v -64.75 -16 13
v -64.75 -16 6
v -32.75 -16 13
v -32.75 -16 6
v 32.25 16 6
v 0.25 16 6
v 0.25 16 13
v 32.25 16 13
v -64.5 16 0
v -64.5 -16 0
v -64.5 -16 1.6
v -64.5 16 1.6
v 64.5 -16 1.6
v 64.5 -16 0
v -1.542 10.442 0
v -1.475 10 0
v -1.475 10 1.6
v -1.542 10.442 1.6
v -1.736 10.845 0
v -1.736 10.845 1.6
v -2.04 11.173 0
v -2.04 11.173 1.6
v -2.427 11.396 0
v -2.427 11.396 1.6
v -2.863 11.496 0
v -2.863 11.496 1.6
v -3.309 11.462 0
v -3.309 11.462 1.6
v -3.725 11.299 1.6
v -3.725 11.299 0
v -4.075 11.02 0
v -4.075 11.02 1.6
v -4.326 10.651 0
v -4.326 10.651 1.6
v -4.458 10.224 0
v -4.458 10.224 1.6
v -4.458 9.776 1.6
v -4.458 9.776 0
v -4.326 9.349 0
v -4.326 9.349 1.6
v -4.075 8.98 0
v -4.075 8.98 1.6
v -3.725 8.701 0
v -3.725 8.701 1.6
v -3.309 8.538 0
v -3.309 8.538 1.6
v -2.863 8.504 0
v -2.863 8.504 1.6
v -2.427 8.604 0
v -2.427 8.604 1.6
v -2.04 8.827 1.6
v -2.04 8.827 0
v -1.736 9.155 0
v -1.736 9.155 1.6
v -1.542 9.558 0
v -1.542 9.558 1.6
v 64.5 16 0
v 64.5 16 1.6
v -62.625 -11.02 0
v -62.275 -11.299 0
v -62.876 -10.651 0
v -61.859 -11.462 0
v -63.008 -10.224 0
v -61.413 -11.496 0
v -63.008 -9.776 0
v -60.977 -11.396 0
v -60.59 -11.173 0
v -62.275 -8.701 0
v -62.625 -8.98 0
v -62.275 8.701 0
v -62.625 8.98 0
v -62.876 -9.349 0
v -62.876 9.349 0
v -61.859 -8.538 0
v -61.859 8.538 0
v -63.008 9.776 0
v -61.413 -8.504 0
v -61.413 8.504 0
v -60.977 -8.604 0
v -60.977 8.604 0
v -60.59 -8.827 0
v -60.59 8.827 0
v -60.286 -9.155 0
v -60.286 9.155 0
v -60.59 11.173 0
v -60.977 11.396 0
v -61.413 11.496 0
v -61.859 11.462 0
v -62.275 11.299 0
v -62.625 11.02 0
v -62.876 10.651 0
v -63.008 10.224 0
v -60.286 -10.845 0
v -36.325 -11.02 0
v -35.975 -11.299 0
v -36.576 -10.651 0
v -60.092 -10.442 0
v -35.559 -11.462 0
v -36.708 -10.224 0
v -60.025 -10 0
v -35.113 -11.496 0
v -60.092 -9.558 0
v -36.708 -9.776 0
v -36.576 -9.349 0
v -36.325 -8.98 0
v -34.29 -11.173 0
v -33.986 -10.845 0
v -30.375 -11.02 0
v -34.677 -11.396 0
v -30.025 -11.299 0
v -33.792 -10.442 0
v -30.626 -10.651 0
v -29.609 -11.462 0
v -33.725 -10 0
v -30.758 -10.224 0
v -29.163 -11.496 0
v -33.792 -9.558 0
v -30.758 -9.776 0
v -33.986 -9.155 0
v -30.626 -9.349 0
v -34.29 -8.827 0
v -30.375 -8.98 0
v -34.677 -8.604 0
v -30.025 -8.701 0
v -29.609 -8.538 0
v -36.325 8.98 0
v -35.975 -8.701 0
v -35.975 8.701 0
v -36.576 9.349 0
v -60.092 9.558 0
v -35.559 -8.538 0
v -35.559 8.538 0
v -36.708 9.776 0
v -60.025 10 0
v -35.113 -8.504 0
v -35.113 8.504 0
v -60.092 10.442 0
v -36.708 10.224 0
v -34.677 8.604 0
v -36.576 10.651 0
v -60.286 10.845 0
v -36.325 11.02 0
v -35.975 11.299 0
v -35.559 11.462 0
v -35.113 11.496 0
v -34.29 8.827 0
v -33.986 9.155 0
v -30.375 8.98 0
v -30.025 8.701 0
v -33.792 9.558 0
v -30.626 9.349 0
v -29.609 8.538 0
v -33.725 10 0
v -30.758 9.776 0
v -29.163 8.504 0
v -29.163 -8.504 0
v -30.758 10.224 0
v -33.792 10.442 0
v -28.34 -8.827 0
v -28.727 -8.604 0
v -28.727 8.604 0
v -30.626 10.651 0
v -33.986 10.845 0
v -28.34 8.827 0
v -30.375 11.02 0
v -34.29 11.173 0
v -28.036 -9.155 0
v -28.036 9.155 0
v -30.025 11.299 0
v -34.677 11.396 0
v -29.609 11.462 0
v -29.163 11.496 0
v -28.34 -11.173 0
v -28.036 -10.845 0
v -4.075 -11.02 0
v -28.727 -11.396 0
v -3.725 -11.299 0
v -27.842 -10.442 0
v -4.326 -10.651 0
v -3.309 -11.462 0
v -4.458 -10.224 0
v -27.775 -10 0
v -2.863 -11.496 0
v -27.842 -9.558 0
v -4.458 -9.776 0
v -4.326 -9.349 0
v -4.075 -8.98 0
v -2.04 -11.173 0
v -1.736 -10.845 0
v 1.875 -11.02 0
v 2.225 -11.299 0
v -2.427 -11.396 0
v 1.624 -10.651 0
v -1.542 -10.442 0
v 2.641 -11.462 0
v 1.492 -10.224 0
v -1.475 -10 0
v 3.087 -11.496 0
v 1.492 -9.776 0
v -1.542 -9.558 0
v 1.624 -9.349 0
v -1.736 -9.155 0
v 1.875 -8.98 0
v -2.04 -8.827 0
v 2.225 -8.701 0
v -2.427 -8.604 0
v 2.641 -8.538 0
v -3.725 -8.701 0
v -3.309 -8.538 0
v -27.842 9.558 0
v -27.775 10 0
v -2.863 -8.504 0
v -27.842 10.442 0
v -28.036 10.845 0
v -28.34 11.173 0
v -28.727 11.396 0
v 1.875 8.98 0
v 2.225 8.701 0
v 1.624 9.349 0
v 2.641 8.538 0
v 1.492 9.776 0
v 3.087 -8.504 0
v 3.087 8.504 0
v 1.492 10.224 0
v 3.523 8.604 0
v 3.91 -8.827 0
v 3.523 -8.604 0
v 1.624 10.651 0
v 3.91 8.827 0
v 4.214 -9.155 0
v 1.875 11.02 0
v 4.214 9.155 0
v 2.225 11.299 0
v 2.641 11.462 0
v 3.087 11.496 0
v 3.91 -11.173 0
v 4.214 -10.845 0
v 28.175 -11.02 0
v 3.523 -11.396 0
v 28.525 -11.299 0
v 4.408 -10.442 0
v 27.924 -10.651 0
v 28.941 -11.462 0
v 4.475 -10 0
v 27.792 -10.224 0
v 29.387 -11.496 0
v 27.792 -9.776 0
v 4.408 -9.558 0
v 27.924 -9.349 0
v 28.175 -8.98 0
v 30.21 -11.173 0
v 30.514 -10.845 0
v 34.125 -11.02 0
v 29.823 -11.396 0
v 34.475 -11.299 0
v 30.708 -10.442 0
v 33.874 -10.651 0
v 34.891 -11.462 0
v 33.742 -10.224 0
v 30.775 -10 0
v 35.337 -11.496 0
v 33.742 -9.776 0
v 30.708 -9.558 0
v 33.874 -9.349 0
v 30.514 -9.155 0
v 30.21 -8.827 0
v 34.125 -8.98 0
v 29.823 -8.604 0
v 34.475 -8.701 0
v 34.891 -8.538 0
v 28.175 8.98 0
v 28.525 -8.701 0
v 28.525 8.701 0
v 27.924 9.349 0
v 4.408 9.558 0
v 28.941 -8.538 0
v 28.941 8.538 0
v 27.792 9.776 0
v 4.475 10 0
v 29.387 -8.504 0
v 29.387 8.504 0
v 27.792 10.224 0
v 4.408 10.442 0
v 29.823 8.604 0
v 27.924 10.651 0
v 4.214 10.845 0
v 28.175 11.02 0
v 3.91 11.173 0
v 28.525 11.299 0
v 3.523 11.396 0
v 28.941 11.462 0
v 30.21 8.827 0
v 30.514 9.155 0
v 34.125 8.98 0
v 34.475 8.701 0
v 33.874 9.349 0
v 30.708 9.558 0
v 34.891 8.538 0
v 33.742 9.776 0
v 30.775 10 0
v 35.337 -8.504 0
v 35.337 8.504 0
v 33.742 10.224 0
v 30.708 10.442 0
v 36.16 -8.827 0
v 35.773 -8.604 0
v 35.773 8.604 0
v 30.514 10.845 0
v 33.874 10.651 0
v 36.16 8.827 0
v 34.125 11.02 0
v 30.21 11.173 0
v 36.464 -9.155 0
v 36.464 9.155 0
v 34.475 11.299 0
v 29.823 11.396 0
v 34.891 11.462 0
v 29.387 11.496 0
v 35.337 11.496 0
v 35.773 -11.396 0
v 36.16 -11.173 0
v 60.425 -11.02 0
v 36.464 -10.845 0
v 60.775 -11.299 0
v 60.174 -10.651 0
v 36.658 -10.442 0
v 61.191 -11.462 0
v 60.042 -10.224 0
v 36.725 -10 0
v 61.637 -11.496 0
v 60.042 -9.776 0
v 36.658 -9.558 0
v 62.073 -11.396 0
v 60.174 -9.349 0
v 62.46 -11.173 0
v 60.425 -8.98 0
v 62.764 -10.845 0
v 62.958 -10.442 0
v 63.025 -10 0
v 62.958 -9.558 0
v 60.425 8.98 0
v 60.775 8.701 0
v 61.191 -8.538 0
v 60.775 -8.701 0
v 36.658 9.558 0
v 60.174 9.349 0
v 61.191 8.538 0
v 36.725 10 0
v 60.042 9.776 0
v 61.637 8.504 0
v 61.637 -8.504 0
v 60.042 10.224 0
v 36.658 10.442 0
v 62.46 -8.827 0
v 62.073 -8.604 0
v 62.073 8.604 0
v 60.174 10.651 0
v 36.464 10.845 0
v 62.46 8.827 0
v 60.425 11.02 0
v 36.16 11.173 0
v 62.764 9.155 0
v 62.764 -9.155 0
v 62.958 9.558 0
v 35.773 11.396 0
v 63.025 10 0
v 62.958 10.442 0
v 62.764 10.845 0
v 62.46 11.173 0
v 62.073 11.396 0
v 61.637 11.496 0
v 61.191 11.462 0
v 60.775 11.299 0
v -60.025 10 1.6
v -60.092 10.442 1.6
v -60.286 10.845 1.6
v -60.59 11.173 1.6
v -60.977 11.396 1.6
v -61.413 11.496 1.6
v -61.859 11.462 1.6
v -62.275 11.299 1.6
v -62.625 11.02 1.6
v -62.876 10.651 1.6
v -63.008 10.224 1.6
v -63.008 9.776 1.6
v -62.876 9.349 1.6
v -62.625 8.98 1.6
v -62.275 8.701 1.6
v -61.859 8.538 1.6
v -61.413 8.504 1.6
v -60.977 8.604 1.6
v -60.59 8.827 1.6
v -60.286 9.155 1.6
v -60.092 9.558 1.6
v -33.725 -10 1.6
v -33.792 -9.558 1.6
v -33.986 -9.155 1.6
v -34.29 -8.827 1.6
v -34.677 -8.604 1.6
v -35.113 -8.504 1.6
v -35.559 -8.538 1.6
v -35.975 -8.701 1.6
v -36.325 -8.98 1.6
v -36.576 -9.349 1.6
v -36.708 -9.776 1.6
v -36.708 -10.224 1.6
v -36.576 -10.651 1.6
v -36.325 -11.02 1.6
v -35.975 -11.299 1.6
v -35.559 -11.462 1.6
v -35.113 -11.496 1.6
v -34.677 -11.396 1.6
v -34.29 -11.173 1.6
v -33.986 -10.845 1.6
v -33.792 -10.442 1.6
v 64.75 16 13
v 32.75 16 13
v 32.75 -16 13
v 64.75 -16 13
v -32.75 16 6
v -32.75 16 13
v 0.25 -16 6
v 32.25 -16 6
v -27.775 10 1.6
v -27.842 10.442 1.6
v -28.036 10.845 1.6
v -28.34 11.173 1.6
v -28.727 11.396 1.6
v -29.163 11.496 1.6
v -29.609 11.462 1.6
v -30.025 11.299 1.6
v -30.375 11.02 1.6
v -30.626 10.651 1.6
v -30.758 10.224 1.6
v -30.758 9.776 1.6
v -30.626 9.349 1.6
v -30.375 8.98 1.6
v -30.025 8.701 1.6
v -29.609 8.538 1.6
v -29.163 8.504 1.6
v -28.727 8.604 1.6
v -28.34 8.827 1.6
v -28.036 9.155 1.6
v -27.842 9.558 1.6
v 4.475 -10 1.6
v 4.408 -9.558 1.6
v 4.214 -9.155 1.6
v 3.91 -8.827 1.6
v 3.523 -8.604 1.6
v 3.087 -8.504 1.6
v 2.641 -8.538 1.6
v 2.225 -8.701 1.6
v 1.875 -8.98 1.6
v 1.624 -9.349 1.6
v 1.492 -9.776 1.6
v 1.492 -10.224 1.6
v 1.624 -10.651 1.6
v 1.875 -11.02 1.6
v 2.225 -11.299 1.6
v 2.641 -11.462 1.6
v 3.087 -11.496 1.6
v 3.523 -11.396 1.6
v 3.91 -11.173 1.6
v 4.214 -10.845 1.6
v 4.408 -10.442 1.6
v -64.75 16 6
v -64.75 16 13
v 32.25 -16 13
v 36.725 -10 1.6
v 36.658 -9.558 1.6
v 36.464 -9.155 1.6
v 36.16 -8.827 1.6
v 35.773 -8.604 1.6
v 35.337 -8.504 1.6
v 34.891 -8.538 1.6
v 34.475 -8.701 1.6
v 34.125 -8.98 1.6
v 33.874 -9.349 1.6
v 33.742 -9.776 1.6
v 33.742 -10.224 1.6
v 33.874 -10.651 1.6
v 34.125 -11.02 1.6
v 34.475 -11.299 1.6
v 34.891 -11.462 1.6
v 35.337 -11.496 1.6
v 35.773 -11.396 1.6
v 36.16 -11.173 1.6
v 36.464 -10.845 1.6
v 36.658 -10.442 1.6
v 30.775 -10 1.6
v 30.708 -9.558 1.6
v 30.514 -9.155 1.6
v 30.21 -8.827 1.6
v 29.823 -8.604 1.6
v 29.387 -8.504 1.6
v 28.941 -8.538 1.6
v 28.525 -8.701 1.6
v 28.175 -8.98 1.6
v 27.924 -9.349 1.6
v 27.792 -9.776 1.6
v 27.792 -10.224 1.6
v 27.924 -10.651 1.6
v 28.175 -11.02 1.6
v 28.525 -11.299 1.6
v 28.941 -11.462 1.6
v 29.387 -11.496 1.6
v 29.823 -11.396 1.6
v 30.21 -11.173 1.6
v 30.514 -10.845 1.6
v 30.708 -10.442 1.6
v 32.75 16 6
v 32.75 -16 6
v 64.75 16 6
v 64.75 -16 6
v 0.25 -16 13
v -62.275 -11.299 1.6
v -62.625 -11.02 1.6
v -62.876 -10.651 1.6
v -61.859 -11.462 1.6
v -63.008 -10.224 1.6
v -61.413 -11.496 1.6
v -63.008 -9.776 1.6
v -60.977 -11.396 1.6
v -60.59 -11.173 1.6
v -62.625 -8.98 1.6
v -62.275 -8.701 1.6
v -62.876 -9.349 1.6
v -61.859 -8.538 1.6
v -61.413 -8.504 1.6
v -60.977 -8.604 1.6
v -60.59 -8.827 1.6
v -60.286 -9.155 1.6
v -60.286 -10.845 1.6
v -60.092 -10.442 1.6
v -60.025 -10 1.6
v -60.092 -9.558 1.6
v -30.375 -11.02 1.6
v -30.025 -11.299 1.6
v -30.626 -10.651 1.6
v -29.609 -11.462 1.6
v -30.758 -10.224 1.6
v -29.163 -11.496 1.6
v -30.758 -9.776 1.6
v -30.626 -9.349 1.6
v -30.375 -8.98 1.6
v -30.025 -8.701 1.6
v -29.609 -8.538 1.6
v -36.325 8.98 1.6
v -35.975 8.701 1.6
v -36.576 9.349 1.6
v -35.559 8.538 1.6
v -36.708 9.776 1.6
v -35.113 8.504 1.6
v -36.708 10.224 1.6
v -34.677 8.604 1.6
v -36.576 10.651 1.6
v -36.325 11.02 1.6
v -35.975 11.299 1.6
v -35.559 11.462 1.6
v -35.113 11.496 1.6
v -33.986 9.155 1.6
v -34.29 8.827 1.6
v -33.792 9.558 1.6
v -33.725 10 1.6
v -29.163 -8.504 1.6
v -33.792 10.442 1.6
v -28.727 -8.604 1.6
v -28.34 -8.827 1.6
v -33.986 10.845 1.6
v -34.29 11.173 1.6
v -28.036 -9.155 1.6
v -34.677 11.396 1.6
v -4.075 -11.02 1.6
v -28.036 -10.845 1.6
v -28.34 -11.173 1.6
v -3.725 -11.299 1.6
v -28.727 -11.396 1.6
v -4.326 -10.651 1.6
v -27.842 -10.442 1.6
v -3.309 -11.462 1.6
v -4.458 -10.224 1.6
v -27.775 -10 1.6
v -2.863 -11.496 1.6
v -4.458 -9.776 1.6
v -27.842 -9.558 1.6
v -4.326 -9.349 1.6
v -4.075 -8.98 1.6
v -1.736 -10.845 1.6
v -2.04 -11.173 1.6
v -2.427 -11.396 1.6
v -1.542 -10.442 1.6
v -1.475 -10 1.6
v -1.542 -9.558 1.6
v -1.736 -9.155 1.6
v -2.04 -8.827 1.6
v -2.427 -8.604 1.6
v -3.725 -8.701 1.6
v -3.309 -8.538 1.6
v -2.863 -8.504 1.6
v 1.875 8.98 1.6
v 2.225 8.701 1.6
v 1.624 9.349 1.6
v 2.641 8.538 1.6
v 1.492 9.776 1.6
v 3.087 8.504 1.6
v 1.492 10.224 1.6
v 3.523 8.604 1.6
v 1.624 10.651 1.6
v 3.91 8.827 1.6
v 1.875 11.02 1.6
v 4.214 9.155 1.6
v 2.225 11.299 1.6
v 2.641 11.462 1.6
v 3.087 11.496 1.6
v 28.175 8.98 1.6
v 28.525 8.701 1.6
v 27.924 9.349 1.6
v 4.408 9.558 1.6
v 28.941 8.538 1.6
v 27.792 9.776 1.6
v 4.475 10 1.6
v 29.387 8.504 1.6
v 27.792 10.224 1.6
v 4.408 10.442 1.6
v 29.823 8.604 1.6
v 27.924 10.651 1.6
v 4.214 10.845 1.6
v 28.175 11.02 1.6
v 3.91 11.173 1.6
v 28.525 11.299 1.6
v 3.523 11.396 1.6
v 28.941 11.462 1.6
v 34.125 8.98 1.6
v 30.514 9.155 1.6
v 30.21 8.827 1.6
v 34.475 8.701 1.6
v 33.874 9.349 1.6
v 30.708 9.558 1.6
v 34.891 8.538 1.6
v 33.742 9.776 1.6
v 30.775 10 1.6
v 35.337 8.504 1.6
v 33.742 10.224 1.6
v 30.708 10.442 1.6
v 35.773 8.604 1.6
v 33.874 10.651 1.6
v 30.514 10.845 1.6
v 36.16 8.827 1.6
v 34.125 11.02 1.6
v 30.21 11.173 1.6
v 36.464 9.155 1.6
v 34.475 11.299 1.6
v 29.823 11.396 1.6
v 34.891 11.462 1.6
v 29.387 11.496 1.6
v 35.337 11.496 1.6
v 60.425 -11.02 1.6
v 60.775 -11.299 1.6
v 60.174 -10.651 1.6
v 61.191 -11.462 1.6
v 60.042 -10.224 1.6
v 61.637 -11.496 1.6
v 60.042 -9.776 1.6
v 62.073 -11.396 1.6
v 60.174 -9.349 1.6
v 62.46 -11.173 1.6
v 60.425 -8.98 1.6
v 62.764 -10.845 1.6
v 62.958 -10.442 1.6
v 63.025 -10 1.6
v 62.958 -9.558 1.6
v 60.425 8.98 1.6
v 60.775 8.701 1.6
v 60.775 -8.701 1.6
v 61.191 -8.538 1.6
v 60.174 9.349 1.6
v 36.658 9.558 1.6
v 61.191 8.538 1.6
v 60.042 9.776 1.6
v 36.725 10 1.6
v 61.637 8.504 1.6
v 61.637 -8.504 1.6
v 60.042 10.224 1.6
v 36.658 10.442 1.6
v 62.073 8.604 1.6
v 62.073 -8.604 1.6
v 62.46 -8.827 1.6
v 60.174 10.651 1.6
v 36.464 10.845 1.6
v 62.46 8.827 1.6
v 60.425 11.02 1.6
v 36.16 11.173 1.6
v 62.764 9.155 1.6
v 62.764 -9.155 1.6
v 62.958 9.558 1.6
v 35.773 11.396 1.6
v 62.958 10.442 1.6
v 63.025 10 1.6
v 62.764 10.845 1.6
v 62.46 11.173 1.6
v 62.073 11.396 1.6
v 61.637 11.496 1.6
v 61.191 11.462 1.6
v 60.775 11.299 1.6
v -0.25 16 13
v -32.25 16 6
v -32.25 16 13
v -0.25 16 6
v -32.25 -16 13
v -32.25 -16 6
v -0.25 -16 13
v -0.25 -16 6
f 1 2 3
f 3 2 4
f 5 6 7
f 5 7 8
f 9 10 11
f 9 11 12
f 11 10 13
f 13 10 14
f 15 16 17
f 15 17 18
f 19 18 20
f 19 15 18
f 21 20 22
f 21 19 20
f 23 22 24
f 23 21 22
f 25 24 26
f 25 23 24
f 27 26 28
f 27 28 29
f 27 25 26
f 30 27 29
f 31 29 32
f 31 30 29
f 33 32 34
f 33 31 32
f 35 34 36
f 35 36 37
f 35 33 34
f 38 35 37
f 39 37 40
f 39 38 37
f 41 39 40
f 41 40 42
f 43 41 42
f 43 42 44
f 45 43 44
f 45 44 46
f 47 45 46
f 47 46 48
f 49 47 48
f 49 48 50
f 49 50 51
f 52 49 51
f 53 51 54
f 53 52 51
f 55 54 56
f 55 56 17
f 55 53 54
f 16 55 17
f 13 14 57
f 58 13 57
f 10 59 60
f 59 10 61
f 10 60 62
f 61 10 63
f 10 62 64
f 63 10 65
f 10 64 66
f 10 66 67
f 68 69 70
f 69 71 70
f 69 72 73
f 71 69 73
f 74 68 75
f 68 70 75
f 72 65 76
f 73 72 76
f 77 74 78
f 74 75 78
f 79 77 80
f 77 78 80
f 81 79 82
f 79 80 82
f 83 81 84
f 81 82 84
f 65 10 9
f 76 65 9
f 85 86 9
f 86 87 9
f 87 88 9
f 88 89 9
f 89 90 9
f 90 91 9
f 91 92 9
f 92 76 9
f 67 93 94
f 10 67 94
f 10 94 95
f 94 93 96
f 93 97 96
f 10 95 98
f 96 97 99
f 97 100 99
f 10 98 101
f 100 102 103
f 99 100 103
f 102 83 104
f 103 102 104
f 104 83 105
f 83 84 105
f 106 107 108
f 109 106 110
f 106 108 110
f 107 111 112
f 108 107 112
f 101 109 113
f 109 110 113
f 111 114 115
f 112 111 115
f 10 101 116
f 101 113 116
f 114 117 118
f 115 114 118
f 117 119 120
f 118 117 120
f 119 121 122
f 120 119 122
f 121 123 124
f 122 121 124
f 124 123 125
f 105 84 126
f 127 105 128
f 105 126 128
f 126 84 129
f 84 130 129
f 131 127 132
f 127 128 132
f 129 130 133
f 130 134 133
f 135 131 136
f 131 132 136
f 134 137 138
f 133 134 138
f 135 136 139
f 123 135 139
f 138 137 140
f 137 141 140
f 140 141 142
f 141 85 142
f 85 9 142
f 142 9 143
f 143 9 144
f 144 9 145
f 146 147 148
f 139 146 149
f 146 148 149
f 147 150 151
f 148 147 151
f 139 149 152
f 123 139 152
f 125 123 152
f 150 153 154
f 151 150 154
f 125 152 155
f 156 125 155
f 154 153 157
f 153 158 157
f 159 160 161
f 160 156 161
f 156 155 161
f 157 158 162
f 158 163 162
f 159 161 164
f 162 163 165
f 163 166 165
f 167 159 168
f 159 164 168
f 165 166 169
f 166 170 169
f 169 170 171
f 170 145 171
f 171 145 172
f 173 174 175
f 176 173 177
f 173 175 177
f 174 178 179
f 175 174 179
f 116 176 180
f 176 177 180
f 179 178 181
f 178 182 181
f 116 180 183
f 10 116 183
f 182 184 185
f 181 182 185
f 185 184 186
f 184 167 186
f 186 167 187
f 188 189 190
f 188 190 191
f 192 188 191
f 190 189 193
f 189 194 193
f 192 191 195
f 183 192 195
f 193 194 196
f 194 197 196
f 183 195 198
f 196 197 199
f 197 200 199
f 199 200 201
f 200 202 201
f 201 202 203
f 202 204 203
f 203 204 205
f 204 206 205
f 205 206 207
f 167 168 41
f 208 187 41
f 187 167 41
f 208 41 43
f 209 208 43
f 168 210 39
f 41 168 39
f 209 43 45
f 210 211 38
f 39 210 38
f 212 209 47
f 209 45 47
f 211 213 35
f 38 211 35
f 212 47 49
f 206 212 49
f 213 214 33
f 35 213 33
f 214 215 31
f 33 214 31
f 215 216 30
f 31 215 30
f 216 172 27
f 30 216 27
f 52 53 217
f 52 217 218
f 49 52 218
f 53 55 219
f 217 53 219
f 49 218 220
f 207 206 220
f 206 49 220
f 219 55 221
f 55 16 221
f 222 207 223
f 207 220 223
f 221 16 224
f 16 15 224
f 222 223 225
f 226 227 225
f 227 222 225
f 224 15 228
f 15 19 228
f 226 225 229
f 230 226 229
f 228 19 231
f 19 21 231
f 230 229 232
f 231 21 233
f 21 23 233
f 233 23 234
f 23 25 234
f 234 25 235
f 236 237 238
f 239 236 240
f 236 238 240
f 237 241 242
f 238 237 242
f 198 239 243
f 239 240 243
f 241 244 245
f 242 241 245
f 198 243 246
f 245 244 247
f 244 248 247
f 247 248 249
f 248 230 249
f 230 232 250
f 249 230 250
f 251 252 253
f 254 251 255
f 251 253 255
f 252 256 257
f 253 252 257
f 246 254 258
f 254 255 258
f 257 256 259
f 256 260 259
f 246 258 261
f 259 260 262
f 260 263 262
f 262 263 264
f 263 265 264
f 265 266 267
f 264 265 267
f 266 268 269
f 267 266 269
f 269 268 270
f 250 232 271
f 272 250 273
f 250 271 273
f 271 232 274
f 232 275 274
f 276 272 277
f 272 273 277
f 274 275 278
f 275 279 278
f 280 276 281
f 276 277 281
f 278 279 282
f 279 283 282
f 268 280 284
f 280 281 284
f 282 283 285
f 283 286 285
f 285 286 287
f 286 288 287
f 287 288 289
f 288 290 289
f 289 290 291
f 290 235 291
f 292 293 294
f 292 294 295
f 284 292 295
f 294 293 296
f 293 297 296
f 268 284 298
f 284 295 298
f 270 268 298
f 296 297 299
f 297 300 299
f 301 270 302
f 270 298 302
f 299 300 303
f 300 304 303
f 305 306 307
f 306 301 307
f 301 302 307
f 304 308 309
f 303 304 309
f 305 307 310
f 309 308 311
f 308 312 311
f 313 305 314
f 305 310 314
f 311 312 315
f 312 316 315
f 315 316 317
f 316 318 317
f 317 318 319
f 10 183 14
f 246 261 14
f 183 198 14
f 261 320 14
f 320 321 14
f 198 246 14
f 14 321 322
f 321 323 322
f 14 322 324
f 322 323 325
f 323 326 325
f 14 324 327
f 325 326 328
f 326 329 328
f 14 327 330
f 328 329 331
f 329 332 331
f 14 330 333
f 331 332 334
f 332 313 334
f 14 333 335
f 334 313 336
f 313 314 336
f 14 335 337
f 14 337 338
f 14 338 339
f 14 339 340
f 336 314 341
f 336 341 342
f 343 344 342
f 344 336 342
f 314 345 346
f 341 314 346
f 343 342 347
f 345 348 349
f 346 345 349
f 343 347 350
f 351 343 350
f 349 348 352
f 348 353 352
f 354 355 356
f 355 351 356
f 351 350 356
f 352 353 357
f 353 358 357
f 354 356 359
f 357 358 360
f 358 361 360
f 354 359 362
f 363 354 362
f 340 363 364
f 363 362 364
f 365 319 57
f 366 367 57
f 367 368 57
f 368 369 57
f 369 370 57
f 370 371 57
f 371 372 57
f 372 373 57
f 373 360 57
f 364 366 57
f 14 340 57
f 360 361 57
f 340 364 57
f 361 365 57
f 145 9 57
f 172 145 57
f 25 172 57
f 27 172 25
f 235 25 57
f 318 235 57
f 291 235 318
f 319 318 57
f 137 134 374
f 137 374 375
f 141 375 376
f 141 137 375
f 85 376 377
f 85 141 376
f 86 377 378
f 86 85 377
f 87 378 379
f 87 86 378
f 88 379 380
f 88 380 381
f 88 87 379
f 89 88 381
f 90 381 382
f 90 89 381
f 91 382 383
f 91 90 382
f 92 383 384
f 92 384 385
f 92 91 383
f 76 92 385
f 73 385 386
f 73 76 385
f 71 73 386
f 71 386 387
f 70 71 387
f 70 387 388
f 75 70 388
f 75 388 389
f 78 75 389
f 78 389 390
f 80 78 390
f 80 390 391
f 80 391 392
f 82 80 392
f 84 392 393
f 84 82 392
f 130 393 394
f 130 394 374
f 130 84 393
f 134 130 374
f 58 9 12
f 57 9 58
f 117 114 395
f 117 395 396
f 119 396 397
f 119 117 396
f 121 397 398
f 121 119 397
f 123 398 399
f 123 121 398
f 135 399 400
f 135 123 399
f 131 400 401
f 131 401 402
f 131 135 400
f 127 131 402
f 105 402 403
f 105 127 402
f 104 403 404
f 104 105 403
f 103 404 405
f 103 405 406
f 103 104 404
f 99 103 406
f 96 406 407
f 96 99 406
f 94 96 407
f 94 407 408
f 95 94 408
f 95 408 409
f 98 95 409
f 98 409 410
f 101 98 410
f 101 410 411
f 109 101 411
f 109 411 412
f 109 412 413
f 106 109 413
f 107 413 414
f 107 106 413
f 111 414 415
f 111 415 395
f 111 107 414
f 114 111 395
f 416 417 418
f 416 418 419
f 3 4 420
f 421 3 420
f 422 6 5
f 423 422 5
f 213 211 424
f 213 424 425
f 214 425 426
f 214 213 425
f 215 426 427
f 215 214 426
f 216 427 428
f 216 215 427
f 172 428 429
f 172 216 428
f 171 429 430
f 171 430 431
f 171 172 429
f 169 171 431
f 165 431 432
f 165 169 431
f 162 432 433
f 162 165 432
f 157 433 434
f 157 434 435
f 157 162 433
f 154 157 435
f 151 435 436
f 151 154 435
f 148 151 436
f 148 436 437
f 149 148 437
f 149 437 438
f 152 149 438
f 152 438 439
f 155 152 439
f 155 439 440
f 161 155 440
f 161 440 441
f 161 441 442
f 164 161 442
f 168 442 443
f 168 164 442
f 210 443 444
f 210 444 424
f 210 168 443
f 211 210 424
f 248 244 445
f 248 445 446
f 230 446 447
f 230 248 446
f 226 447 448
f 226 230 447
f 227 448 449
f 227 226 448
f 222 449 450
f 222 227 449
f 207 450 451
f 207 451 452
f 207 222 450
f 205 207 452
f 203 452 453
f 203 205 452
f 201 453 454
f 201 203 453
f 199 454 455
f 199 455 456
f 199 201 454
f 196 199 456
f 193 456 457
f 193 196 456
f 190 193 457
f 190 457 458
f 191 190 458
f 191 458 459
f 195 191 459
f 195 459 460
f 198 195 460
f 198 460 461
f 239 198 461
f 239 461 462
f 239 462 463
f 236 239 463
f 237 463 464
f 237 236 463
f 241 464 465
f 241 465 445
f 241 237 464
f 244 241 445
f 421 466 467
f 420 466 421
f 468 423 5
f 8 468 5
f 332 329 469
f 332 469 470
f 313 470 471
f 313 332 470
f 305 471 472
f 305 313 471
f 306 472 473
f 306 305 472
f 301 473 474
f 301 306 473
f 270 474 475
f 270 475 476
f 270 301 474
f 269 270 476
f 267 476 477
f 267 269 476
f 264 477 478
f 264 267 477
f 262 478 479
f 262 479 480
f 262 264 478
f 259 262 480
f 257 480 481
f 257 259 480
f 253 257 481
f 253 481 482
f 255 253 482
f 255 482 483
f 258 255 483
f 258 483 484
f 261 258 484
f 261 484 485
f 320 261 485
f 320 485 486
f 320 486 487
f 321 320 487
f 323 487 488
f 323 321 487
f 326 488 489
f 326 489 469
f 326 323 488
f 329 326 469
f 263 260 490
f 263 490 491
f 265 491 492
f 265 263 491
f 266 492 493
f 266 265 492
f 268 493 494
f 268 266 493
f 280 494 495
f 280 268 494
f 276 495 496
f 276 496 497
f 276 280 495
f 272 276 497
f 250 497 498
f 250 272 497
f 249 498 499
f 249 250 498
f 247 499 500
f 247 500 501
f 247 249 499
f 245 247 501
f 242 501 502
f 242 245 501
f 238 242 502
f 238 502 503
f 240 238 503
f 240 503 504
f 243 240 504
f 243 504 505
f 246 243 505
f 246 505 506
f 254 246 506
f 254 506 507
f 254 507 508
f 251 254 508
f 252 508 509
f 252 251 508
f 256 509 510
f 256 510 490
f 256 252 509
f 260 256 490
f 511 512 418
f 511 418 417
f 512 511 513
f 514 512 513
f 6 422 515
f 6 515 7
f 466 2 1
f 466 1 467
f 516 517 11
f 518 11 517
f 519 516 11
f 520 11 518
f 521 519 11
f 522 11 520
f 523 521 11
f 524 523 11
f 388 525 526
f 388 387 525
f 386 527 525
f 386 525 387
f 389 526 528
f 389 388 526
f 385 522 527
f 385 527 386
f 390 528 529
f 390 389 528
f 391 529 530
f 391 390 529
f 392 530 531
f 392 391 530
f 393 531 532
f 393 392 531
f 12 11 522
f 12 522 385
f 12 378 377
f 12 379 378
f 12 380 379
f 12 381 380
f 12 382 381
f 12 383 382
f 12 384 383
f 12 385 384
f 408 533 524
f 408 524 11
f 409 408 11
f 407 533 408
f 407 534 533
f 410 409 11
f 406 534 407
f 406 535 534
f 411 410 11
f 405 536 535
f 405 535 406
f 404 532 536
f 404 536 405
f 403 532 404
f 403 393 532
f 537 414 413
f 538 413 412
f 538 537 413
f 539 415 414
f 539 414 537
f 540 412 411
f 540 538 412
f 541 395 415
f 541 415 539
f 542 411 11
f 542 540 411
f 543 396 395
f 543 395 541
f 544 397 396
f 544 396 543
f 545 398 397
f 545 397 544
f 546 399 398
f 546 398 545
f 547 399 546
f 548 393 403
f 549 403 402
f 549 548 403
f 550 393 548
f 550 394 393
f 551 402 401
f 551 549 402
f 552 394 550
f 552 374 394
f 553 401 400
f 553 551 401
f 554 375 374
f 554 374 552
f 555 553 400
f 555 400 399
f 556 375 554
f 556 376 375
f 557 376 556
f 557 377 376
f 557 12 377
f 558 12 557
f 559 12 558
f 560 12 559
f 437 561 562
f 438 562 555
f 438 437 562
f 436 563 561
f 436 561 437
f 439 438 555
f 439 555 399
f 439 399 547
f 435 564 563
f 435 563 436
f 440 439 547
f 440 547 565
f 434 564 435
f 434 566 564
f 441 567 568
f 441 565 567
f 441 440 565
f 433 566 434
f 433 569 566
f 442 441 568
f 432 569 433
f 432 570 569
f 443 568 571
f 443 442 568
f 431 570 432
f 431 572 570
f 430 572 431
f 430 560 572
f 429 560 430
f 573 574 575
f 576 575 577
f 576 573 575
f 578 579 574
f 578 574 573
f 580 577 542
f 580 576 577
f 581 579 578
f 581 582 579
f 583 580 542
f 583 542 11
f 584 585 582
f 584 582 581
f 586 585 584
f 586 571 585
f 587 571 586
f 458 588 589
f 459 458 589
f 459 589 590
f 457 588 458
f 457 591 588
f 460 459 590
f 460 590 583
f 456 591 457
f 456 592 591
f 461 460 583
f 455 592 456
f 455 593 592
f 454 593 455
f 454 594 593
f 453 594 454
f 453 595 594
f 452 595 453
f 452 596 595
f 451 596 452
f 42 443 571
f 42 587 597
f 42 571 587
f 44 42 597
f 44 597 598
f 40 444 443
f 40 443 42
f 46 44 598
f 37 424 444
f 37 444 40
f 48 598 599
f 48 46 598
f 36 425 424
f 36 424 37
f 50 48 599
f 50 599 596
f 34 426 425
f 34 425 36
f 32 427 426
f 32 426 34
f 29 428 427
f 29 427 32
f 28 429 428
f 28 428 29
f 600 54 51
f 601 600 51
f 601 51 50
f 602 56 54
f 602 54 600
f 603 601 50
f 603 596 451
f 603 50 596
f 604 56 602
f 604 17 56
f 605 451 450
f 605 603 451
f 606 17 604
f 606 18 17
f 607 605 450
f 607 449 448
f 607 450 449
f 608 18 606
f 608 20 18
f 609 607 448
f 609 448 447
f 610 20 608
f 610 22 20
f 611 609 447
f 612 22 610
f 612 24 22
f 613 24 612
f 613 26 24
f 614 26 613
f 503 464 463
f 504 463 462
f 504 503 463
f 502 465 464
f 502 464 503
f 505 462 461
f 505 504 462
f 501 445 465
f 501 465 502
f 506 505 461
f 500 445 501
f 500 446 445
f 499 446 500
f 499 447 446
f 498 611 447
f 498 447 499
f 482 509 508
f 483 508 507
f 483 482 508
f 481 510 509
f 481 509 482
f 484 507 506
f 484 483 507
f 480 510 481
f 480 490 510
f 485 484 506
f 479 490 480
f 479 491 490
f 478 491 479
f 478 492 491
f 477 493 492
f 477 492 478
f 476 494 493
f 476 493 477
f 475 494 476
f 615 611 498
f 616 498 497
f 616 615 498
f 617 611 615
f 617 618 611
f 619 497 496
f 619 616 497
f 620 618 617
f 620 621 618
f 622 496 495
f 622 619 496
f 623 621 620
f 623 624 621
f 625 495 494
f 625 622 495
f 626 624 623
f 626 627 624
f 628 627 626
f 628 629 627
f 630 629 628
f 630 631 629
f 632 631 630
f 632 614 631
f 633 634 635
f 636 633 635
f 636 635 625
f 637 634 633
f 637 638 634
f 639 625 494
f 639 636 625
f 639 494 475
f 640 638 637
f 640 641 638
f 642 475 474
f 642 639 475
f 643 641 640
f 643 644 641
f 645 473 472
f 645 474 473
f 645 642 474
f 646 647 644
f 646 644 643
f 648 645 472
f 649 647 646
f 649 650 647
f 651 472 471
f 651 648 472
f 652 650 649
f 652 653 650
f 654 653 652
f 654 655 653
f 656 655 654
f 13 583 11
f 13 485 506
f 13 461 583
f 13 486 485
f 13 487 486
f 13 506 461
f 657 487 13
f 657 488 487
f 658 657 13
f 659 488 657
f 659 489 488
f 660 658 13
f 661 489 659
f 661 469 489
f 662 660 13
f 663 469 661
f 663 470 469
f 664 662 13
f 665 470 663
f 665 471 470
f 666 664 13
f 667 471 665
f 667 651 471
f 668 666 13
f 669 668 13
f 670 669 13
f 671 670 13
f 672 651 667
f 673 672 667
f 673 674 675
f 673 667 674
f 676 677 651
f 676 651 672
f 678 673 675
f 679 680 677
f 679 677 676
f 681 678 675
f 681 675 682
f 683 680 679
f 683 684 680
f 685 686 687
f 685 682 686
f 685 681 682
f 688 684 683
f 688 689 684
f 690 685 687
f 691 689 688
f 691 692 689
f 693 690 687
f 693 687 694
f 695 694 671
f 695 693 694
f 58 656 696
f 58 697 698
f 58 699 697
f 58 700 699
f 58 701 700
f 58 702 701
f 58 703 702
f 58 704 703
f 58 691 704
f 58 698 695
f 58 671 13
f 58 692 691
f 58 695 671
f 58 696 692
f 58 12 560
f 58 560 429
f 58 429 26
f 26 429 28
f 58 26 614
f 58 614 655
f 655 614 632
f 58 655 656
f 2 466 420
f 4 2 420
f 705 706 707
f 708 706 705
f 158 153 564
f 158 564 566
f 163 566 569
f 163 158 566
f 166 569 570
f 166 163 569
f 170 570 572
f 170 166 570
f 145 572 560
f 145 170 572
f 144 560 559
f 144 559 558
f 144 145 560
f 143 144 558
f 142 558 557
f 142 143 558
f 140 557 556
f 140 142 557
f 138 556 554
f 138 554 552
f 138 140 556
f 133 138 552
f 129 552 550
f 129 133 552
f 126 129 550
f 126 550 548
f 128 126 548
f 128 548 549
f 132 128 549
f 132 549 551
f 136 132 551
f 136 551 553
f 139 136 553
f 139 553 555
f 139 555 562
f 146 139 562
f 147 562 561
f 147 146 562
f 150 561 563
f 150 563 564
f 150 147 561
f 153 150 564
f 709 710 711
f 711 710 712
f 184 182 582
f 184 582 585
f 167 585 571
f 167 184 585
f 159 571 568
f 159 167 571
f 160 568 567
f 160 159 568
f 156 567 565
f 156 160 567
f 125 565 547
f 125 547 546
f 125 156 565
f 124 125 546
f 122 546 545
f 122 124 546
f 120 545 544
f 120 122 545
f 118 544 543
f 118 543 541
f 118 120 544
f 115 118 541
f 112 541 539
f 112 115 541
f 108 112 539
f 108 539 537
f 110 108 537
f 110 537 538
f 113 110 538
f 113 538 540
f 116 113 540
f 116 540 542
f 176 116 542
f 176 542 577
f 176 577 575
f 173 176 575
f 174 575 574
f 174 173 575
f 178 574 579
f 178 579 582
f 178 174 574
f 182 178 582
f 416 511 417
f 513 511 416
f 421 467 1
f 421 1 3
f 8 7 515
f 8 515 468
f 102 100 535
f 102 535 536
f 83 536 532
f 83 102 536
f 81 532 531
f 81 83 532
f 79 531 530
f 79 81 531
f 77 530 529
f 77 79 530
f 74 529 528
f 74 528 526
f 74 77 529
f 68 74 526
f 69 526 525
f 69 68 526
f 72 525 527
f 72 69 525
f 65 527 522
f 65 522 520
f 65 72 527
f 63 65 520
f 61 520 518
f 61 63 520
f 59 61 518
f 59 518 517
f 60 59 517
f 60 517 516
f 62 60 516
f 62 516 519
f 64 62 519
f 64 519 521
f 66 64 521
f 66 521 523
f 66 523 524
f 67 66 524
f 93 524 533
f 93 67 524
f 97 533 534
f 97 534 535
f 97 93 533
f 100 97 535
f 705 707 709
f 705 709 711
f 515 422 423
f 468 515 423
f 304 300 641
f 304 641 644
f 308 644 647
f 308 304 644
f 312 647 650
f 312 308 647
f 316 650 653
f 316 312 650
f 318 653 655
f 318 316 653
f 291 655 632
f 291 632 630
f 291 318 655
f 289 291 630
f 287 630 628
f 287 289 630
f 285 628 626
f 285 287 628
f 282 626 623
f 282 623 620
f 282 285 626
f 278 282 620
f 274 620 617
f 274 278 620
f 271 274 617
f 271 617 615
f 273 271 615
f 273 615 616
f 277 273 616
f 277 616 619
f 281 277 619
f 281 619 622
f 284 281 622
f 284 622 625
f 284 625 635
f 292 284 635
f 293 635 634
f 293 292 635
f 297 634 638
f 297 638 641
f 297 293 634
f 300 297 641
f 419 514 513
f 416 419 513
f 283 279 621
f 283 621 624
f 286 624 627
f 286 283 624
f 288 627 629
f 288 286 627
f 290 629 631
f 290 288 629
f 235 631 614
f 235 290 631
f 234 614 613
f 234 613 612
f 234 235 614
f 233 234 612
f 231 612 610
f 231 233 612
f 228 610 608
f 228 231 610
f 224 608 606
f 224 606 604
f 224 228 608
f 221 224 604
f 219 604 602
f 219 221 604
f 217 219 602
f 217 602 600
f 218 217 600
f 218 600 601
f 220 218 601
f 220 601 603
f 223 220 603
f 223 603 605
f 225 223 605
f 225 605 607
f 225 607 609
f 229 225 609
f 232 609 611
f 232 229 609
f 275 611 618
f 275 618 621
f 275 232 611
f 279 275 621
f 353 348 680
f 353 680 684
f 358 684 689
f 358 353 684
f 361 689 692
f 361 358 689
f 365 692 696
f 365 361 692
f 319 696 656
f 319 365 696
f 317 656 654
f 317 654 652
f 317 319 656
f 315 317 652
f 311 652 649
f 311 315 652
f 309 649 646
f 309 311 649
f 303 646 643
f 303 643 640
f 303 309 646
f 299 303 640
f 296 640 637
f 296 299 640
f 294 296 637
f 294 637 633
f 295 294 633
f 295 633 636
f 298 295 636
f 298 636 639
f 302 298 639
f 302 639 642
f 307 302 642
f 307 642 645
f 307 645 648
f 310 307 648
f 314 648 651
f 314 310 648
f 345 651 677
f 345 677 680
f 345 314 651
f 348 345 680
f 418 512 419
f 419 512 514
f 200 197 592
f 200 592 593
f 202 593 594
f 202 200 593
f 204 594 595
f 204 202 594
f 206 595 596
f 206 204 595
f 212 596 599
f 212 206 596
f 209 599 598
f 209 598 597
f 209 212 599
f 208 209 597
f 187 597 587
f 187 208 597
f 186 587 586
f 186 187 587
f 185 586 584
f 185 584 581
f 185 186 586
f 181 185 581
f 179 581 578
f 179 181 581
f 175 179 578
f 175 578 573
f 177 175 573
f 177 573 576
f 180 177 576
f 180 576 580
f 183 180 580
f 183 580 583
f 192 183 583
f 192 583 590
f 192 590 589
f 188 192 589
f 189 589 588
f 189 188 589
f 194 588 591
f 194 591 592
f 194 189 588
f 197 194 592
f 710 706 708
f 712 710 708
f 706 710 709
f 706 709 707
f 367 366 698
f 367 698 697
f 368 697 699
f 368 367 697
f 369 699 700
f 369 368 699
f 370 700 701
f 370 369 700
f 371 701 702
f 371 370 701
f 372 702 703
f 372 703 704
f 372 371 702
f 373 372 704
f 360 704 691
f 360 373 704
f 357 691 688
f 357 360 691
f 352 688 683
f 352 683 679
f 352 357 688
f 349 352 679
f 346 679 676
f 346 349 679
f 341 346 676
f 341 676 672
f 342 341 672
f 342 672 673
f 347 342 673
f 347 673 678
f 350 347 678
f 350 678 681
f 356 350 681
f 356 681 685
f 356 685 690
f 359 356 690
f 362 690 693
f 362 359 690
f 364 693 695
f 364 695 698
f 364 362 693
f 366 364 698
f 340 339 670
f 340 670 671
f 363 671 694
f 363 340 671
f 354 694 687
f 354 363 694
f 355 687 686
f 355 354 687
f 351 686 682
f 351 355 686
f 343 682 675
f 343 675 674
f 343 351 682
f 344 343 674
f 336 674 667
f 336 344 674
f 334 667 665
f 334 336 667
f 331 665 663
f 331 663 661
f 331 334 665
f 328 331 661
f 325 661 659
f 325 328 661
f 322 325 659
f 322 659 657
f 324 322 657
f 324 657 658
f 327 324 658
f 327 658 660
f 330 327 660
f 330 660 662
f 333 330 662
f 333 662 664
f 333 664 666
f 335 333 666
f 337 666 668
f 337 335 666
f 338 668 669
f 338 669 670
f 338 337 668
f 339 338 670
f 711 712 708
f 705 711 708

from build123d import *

# Parameters (mm, degrees)
SKETCH_1_W        = 129
SKETCH_1_H        = 32
SKETCH_1_R        = 1.5
EXTRUDE_1_DEPTH   = 1.6
EXTRUDE_START     = 4.4
SKETCH_2_W        = 32
SKETCH_2_H        = 32
EXTRUDE_2_DEPTH   = 7
EXTRUDE_2_2_DEPTH = 7
EXTRUDE_2_3_DEPTH = 7
EXTRUDE_2_4_DEPTH = 7


with BuildPart() as part:
    # Эскиз1 → Бобышка-Вытянуть1 (new body)
    with BuildSketch(Plane.XY):
        Rectangle(SKETCH_1_W, SKETCH_1_H)
        with Locations((-61.525, 10)):
            Circle(SKETCH_1_R, mode=Mode.SUBTRACT)
        with Locations((-61.525, -10)):
            Circle(SKETCH_1_R, mode=Mode.SUBTRACT)
        with Locations((-35.225, -10)):
            Circle(SKETCH_1_R, mode=Mode.SUBTRACT)
        with Locations((-35.225, 10)):
            Circle(SKETCH_1_R, mode=Mode.SUBTRACT)
        with Locations((-29.275, 10)):
            Circle(SKETCH_1_R, mode=Mode.SUBTRACT)
        with Locations((-29.275, -10)):
            Circle(SKETCH_1_R, mode=Mode.SUBTRACT)
        with Locations((-2.975, 10)):
            Circle(SKETCH_1_R, mode=Mode.SUBTRACT)
        with Locations((-2.975, -10)):
            Circle(SKETCH_1_R, mode=Mode.SUBTRACT)
        with Locations((2.975, 10)):
            Circle(SKETCH_1_R, mode=Mode.SUBTRACT)
        with Locations((2.975, -10)):
            Circle(SKETCH_1_R, mode=Mode.SUBTRACT)
        with Locations((29.275, 10)):
            Circle(SKETCH_1_R, mode=Mode.SUBTRACT)
        with Locations((29.275, -10)):
            Circle(SKETCH_1_R, mode=Mode.SUBTRACT)
        with Locations((35.225, 10)):
            Circle(SKETCH_1_R, mode=Mode.SUBTRACT)
        with Locations((35.225, -10)):
            Circle(SKETCH_1_R, mode=Mode.SUBTRACT)
        with Locations((61.525, 10)):
            Circle(SKETCH_1_R, mode=Mode.SUBTRACT)
        with Locations((61.525, -10)):
            Circle(SKETCH_1_R, mode=Mode.SUBTRACT)
    extrude(amount=EXTRUDE_1_DEPTH)


with BuildPart() as body_2:
    # Эскиз2 → Бобышка-Вытянуть2 (new body)
    with BuildSketch(Plane.XY.offset(1.6).offset(EXTRUDE_START)):
        with Locations((-48.75, 0)):
            Rectangle(SKETCH_2_W, SKETCH_2_H)
    extrude(amount=EXTRUDE_2_DEPTH)


with BuildPart() as body_3:
    # Эскиз2 → Extrude 2 2 (new body)
    with BuildSketch(Plane.XY.offset(1.6).offset(EXTRUDE_START)):
        with Locations((-16.25, 0)):
            Rectangle(SKETCH_2_W, SKETCH_2_H)
    extrude(amount=EXTRUDE_2_2_DEPTH)


with BuildPart() as body_4:
    # Эскиз2 → Extrude 2 3 (new body)
    with BuildSketch(Plane.XY.offset(1.6).offset(EXTRUDE_START)):
        with Locations((16.25, 0)):
            Rectangle(SKETCH_2_W, SKETCH_2_H)
    extrude(amount=EXTRUDE_2_3_DEPTH)


with BuildPart() as body_5:
    # Эскиз2 → Extrude 2 4 (new body)
    with BuildSketch(Plane.XY.offset(1.6).offset(EXTRUDE_START)):
        with Locations((48.75, 0)):
            Rectangle(SKETCH_2_W, SKETCH_2_H)
    extrude(amount=EXTRUDE_2_4_DEPTH)


solid = Compound([part.part, body_2.part, body_3.part, body_4.part, body_5.part])
